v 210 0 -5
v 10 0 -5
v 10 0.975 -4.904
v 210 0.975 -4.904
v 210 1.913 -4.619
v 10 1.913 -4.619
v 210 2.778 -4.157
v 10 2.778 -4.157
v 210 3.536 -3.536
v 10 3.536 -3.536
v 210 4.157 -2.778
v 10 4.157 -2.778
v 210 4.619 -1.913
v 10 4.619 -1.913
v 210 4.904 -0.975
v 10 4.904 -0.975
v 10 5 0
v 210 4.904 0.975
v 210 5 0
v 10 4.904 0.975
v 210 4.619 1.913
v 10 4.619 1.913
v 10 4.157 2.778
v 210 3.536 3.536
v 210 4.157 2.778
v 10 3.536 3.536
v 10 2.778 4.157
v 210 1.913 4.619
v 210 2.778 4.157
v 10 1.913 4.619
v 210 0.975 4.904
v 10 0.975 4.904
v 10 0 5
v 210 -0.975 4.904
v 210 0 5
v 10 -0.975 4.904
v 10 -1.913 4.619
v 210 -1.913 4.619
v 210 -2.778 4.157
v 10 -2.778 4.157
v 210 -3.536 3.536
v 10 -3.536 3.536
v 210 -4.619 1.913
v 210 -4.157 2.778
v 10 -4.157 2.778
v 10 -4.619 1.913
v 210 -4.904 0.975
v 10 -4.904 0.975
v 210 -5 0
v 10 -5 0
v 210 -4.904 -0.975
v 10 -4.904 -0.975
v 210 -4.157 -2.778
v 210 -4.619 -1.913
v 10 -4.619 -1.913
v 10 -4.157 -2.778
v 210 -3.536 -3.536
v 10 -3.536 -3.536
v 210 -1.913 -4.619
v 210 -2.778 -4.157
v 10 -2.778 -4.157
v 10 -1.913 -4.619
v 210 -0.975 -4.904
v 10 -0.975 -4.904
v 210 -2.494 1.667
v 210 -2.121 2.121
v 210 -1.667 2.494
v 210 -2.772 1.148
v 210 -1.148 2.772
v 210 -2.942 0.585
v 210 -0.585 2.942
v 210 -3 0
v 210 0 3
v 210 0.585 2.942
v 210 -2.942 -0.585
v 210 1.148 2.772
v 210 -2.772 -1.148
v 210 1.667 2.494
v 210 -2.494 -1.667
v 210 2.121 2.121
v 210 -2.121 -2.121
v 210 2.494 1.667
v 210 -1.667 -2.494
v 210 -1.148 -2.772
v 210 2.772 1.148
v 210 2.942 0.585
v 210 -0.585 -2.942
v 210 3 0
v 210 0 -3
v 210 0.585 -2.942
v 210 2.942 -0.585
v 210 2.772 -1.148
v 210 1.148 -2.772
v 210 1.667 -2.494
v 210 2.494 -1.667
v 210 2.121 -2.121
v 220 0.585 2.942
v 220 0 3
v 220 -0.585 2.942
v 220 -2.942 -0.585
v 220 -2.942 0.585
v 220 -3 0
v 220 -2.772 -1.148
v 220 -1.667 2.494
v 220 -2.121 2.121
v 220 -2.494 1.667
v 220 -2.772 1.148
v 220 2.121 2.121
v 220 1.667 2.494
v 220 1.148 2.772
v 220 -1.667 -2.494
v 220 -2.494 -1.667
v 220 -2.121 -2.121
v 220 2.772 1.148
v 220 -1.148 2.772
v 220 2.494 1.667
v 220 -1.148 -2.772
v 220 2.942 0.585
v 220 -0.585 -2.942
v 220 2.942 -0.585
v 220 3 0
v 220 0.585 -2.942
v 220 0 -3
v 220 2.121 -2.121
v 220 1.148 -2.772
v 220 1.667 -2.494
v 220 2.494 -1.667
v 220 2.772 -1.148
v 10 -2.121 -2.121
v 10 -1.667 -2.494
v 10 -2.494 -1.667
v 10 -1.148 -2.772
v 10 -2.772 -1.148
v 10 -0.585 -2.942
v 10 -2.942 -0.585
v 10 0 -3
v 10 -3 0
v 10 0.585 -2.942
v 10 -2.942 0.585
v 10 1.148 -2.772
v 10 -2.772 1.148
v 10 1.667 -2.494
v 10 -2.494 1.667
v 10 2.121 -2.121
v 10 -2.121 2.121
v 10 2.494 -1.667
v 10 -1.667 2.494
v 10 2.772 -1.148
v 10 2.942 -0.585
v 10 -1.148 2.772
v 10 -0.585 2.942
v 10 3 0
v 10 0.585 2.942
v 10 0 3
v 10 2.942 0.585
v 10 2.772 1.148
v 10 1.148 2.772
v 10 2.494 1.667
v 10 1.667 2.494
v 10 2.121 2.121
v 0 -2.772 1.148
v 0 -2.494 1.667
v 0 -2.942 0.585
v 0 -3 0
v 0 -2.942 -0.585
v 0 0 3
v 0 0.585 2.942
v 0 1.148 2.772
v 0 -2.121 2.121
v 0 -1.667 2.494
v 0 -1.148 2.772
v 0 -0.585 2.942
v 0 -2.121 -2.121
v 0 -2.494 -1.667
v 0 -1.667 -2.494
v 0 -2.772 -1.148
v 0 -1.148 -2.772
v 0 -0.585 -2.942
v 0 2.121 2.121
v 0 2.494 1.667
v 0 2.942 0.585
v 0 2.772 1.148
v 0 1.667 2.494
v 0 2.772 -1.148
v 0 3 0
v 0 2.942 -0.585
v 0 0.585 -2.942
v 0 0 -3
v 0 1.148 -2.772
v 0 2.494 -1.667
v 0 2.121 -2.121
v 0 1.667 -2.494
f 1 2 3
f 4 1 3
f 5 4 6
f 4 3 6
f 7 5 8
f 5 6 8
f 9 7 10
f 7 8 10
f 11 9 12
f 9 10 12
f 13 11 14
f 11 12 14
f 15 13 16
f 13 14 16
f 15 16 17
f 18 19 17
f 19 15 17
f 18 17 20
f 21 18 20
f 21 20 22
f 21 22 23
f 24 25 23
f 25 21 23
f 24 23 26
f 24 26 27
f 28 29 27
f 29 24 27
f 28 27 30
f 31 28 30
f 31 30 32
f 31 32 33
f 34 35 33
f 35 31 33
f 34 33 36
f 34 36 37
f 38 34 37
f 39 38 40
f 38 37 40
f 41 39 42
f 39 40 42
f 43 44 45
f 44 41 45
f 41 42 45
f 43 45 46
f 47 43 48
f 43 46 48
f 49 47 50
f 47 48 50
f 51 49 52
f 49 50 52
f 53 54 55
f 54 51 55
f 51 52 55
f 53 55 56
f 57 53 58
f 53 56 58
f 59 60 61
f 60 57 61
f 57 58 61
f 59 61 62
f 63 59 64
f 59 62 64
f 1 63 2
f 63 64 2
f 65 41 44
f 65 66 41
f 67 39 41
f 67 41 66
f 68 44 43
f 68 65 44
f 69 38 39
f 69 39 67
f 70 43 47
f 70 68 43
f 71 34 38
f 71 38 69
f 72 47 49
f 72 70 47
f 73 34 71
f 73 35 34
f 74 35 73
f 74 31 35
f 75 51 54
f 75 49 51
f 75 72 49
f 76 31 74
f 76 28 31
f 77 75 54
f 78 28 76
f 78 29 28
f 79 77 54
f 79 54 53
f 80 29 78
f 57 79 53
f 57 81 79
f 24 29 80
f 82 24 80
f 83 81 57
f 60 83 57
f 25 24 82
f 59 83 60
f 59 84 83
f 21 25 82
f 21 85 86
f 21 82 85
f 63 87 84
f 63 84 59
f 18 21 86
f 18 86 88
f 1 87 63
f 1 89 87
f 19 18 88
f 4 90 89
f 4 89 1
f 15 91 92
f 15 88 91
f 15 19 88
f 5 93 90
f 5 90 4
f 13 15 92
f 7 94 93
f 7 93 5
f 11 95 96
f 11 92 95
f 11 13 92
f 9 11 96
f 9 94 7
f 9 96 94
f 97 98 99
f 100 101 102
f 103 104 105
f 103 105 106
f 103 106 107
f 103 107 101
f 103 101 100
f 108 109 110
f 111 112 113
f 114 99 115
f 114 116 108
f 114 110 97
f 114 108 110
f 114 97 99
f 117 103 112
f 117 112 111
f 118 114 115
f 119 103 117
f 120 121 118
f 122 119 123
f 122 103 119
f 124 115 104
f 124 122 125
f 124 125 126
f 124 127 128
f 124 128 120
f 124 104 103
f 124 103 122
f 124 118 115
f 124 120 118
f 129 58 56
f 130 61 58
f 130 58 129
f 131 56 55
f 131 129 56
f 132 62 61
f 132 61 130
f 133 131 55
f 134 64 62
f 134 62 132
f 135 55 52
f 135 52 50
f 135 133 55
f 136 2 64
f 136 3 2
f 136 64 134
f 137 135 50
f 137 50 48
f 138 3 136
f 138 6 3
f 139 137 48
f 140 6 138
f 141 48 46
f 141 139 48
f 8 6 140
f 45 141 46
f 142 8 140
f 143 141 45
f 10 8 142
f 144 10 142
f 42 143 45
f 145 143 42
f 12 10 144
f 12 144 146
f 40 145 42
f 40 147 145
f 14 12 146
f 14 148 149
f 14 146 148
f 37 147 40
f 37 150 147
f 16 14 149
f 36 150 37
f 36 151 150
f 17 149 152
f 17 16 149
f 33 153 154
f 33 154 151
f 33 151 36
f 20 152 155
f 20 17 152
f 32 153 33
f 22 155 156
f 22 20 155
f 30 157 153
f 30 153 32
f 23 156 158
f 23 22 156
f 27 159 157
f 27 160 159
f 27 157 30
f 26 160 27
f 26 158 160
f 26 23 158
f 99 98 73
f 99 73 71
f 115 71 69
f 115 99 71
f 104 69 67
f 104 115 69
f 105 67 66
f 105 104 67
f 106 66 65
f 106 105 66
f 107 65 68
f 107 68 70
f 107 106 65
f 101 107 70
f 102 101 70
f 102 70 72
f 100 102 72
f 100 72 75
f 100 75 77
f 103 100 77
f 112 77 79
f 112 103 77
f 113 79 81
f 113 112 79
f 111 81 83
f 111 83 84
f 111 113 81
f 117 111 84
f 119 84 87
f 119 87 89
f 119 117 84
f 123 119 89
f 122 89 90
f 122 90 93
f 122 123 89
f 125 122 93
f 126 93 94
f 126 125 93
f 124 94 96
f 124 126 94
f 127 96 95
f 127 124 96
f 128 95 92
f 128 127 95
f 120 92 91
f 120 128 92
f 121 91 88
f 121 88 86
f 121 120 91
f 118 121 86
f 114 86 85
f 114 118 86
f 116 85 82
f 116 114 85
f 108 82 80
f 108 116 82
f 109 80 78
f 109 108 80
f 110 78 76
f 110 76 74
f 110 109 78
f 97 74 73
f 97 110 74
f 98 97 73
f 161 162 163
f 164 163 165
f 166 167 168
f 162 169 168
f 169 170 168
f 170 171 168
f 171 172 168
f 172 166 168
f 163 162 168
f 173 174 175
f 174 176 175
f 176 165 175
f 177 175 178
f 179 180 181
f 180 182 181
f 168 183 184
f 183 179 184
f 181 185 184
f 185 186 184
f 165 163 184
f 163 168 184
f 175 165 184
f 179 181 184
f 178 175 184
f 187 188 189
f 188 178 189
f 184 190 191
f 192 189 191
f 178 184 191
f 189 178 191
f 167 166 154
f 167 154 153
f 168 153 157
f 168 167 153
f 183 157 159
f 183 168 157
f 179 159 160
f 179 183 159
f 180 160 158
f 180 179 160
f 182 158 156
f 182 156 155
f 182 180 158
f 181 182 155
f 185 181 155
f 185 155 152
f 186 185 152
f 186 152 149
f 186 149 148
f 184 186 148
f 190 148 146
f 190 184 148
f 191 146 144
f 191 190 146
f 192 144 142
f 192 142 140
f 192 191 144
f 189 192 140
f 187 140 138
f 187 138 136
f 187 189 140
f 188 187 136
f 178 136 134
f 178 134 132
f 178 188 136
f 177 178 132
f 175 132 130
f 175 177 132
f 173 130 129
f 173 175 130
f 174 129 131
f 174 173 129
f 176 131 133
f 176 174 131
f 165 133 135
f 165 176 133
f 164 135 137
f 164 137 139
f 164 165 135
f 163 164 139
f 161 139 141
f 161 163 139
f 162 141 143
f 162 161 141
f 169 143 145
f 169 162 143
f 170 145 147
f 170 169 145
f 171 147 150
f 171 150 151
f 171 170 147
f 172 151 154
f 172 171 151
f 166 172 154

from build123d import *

# Parameters (mm, degrees)
CROQUIS1_R              = 5
SALIENTE_EXTRUIR1_DEPTH = 220
CROQUIS2_R              = 5
SALIENTE_EXTRUIR2_DEPTH = 10
SALIENTE_EXTRUIR3_START = -10
CROQUIS3_R              = 5
SALIENTE_EXTRUIR3_DEPTH = 10
CROQUIS4_OUTSIDE_W      = 56.09
CROQUIS4_OUTSIDE_H      = 56.09
CROQUIS4_OUTSIDE_R      = 3
CORTAR_EXTRUIR1_DEPTH   = 10
CROQUIS5_OUTSIDE_W      = 56.09
CROQUIS5_OUTSIDE_H      = 56.09
CROQUIS5_OUTSIDE_R      = 3
CORTAR_EXTRUIR2_DEPTH   = 10


with BuildPart() as part:
    # Croquis1 → Saliente-Extruir1 (new body)
    with BuildSketch(Plane(origin=(0, 0, 0), x_dir=(0, 0, -1), z_dir=(1, 0, 0))):
        Circle(CROQUIS1_R)
    extrude(amount=SALIENTE_EXTRUIR1_DEPTH)

    # Croquis2 → Saliente-Extruir2 (add)
    with BuildSketch(Plane.ZY):
        with Locations(Location((0, 0, 0), (0, 0, 180))):
            Circle(CROQUIS2_R)
    extrude(amount=-SALIENTE_EXTRUIR2_DEPTH)

    # Croquis3 → Saliente-Extruir3 (add)
    with BuildSketch(Plane(origin=(220, 0, 0), x_dir=(0, 0, -1), z_dir=(1, 0, 0)).offset(SALIENTE_EXTRUIR3_START)):
        Circle(CROQUIS3_R)
    extrude(amount=SALIENTE_EXTRUIR3_DEPTH)

    # Croquis4 outside → Cortar-Extruir1 (cut)
    with BuildSketch(Plane.ZY):
        Rectangle(CROQUIS4_OUTSIDE_W, CROQUIS4_OUTSIDE_H)
        Circle(CROQUIS4_OUTSIDE_R, mode=Mode.SUBTRACT)
    extrude(amount=-CORTAR_EXTRUIR1_DEPTH, mode=Mode.SUBTRACT)

    # Croquis5 outside → Cortar-Extruir2 (cut)
    with BuildSketch(Plane(origin=(220, 0, 0), x_dir=(0, 0, -1), z_dir=(1, 0, 0))):
        Rectangle(CROQUIS5_OUTSIDE_W, CROQUIS5_OUTSIDE_H)
        with Locations(Location((0, 0, 0), (0, 0, 180))):
            Circle(CROQUIS5_OUTSIDE_R, mode=Mode.SUBTRACT)
    extrude(amount=-CORTAR_EXTRUIR2_DEPTH, mode=Mode.SUBTRACT)


solid = part.part
